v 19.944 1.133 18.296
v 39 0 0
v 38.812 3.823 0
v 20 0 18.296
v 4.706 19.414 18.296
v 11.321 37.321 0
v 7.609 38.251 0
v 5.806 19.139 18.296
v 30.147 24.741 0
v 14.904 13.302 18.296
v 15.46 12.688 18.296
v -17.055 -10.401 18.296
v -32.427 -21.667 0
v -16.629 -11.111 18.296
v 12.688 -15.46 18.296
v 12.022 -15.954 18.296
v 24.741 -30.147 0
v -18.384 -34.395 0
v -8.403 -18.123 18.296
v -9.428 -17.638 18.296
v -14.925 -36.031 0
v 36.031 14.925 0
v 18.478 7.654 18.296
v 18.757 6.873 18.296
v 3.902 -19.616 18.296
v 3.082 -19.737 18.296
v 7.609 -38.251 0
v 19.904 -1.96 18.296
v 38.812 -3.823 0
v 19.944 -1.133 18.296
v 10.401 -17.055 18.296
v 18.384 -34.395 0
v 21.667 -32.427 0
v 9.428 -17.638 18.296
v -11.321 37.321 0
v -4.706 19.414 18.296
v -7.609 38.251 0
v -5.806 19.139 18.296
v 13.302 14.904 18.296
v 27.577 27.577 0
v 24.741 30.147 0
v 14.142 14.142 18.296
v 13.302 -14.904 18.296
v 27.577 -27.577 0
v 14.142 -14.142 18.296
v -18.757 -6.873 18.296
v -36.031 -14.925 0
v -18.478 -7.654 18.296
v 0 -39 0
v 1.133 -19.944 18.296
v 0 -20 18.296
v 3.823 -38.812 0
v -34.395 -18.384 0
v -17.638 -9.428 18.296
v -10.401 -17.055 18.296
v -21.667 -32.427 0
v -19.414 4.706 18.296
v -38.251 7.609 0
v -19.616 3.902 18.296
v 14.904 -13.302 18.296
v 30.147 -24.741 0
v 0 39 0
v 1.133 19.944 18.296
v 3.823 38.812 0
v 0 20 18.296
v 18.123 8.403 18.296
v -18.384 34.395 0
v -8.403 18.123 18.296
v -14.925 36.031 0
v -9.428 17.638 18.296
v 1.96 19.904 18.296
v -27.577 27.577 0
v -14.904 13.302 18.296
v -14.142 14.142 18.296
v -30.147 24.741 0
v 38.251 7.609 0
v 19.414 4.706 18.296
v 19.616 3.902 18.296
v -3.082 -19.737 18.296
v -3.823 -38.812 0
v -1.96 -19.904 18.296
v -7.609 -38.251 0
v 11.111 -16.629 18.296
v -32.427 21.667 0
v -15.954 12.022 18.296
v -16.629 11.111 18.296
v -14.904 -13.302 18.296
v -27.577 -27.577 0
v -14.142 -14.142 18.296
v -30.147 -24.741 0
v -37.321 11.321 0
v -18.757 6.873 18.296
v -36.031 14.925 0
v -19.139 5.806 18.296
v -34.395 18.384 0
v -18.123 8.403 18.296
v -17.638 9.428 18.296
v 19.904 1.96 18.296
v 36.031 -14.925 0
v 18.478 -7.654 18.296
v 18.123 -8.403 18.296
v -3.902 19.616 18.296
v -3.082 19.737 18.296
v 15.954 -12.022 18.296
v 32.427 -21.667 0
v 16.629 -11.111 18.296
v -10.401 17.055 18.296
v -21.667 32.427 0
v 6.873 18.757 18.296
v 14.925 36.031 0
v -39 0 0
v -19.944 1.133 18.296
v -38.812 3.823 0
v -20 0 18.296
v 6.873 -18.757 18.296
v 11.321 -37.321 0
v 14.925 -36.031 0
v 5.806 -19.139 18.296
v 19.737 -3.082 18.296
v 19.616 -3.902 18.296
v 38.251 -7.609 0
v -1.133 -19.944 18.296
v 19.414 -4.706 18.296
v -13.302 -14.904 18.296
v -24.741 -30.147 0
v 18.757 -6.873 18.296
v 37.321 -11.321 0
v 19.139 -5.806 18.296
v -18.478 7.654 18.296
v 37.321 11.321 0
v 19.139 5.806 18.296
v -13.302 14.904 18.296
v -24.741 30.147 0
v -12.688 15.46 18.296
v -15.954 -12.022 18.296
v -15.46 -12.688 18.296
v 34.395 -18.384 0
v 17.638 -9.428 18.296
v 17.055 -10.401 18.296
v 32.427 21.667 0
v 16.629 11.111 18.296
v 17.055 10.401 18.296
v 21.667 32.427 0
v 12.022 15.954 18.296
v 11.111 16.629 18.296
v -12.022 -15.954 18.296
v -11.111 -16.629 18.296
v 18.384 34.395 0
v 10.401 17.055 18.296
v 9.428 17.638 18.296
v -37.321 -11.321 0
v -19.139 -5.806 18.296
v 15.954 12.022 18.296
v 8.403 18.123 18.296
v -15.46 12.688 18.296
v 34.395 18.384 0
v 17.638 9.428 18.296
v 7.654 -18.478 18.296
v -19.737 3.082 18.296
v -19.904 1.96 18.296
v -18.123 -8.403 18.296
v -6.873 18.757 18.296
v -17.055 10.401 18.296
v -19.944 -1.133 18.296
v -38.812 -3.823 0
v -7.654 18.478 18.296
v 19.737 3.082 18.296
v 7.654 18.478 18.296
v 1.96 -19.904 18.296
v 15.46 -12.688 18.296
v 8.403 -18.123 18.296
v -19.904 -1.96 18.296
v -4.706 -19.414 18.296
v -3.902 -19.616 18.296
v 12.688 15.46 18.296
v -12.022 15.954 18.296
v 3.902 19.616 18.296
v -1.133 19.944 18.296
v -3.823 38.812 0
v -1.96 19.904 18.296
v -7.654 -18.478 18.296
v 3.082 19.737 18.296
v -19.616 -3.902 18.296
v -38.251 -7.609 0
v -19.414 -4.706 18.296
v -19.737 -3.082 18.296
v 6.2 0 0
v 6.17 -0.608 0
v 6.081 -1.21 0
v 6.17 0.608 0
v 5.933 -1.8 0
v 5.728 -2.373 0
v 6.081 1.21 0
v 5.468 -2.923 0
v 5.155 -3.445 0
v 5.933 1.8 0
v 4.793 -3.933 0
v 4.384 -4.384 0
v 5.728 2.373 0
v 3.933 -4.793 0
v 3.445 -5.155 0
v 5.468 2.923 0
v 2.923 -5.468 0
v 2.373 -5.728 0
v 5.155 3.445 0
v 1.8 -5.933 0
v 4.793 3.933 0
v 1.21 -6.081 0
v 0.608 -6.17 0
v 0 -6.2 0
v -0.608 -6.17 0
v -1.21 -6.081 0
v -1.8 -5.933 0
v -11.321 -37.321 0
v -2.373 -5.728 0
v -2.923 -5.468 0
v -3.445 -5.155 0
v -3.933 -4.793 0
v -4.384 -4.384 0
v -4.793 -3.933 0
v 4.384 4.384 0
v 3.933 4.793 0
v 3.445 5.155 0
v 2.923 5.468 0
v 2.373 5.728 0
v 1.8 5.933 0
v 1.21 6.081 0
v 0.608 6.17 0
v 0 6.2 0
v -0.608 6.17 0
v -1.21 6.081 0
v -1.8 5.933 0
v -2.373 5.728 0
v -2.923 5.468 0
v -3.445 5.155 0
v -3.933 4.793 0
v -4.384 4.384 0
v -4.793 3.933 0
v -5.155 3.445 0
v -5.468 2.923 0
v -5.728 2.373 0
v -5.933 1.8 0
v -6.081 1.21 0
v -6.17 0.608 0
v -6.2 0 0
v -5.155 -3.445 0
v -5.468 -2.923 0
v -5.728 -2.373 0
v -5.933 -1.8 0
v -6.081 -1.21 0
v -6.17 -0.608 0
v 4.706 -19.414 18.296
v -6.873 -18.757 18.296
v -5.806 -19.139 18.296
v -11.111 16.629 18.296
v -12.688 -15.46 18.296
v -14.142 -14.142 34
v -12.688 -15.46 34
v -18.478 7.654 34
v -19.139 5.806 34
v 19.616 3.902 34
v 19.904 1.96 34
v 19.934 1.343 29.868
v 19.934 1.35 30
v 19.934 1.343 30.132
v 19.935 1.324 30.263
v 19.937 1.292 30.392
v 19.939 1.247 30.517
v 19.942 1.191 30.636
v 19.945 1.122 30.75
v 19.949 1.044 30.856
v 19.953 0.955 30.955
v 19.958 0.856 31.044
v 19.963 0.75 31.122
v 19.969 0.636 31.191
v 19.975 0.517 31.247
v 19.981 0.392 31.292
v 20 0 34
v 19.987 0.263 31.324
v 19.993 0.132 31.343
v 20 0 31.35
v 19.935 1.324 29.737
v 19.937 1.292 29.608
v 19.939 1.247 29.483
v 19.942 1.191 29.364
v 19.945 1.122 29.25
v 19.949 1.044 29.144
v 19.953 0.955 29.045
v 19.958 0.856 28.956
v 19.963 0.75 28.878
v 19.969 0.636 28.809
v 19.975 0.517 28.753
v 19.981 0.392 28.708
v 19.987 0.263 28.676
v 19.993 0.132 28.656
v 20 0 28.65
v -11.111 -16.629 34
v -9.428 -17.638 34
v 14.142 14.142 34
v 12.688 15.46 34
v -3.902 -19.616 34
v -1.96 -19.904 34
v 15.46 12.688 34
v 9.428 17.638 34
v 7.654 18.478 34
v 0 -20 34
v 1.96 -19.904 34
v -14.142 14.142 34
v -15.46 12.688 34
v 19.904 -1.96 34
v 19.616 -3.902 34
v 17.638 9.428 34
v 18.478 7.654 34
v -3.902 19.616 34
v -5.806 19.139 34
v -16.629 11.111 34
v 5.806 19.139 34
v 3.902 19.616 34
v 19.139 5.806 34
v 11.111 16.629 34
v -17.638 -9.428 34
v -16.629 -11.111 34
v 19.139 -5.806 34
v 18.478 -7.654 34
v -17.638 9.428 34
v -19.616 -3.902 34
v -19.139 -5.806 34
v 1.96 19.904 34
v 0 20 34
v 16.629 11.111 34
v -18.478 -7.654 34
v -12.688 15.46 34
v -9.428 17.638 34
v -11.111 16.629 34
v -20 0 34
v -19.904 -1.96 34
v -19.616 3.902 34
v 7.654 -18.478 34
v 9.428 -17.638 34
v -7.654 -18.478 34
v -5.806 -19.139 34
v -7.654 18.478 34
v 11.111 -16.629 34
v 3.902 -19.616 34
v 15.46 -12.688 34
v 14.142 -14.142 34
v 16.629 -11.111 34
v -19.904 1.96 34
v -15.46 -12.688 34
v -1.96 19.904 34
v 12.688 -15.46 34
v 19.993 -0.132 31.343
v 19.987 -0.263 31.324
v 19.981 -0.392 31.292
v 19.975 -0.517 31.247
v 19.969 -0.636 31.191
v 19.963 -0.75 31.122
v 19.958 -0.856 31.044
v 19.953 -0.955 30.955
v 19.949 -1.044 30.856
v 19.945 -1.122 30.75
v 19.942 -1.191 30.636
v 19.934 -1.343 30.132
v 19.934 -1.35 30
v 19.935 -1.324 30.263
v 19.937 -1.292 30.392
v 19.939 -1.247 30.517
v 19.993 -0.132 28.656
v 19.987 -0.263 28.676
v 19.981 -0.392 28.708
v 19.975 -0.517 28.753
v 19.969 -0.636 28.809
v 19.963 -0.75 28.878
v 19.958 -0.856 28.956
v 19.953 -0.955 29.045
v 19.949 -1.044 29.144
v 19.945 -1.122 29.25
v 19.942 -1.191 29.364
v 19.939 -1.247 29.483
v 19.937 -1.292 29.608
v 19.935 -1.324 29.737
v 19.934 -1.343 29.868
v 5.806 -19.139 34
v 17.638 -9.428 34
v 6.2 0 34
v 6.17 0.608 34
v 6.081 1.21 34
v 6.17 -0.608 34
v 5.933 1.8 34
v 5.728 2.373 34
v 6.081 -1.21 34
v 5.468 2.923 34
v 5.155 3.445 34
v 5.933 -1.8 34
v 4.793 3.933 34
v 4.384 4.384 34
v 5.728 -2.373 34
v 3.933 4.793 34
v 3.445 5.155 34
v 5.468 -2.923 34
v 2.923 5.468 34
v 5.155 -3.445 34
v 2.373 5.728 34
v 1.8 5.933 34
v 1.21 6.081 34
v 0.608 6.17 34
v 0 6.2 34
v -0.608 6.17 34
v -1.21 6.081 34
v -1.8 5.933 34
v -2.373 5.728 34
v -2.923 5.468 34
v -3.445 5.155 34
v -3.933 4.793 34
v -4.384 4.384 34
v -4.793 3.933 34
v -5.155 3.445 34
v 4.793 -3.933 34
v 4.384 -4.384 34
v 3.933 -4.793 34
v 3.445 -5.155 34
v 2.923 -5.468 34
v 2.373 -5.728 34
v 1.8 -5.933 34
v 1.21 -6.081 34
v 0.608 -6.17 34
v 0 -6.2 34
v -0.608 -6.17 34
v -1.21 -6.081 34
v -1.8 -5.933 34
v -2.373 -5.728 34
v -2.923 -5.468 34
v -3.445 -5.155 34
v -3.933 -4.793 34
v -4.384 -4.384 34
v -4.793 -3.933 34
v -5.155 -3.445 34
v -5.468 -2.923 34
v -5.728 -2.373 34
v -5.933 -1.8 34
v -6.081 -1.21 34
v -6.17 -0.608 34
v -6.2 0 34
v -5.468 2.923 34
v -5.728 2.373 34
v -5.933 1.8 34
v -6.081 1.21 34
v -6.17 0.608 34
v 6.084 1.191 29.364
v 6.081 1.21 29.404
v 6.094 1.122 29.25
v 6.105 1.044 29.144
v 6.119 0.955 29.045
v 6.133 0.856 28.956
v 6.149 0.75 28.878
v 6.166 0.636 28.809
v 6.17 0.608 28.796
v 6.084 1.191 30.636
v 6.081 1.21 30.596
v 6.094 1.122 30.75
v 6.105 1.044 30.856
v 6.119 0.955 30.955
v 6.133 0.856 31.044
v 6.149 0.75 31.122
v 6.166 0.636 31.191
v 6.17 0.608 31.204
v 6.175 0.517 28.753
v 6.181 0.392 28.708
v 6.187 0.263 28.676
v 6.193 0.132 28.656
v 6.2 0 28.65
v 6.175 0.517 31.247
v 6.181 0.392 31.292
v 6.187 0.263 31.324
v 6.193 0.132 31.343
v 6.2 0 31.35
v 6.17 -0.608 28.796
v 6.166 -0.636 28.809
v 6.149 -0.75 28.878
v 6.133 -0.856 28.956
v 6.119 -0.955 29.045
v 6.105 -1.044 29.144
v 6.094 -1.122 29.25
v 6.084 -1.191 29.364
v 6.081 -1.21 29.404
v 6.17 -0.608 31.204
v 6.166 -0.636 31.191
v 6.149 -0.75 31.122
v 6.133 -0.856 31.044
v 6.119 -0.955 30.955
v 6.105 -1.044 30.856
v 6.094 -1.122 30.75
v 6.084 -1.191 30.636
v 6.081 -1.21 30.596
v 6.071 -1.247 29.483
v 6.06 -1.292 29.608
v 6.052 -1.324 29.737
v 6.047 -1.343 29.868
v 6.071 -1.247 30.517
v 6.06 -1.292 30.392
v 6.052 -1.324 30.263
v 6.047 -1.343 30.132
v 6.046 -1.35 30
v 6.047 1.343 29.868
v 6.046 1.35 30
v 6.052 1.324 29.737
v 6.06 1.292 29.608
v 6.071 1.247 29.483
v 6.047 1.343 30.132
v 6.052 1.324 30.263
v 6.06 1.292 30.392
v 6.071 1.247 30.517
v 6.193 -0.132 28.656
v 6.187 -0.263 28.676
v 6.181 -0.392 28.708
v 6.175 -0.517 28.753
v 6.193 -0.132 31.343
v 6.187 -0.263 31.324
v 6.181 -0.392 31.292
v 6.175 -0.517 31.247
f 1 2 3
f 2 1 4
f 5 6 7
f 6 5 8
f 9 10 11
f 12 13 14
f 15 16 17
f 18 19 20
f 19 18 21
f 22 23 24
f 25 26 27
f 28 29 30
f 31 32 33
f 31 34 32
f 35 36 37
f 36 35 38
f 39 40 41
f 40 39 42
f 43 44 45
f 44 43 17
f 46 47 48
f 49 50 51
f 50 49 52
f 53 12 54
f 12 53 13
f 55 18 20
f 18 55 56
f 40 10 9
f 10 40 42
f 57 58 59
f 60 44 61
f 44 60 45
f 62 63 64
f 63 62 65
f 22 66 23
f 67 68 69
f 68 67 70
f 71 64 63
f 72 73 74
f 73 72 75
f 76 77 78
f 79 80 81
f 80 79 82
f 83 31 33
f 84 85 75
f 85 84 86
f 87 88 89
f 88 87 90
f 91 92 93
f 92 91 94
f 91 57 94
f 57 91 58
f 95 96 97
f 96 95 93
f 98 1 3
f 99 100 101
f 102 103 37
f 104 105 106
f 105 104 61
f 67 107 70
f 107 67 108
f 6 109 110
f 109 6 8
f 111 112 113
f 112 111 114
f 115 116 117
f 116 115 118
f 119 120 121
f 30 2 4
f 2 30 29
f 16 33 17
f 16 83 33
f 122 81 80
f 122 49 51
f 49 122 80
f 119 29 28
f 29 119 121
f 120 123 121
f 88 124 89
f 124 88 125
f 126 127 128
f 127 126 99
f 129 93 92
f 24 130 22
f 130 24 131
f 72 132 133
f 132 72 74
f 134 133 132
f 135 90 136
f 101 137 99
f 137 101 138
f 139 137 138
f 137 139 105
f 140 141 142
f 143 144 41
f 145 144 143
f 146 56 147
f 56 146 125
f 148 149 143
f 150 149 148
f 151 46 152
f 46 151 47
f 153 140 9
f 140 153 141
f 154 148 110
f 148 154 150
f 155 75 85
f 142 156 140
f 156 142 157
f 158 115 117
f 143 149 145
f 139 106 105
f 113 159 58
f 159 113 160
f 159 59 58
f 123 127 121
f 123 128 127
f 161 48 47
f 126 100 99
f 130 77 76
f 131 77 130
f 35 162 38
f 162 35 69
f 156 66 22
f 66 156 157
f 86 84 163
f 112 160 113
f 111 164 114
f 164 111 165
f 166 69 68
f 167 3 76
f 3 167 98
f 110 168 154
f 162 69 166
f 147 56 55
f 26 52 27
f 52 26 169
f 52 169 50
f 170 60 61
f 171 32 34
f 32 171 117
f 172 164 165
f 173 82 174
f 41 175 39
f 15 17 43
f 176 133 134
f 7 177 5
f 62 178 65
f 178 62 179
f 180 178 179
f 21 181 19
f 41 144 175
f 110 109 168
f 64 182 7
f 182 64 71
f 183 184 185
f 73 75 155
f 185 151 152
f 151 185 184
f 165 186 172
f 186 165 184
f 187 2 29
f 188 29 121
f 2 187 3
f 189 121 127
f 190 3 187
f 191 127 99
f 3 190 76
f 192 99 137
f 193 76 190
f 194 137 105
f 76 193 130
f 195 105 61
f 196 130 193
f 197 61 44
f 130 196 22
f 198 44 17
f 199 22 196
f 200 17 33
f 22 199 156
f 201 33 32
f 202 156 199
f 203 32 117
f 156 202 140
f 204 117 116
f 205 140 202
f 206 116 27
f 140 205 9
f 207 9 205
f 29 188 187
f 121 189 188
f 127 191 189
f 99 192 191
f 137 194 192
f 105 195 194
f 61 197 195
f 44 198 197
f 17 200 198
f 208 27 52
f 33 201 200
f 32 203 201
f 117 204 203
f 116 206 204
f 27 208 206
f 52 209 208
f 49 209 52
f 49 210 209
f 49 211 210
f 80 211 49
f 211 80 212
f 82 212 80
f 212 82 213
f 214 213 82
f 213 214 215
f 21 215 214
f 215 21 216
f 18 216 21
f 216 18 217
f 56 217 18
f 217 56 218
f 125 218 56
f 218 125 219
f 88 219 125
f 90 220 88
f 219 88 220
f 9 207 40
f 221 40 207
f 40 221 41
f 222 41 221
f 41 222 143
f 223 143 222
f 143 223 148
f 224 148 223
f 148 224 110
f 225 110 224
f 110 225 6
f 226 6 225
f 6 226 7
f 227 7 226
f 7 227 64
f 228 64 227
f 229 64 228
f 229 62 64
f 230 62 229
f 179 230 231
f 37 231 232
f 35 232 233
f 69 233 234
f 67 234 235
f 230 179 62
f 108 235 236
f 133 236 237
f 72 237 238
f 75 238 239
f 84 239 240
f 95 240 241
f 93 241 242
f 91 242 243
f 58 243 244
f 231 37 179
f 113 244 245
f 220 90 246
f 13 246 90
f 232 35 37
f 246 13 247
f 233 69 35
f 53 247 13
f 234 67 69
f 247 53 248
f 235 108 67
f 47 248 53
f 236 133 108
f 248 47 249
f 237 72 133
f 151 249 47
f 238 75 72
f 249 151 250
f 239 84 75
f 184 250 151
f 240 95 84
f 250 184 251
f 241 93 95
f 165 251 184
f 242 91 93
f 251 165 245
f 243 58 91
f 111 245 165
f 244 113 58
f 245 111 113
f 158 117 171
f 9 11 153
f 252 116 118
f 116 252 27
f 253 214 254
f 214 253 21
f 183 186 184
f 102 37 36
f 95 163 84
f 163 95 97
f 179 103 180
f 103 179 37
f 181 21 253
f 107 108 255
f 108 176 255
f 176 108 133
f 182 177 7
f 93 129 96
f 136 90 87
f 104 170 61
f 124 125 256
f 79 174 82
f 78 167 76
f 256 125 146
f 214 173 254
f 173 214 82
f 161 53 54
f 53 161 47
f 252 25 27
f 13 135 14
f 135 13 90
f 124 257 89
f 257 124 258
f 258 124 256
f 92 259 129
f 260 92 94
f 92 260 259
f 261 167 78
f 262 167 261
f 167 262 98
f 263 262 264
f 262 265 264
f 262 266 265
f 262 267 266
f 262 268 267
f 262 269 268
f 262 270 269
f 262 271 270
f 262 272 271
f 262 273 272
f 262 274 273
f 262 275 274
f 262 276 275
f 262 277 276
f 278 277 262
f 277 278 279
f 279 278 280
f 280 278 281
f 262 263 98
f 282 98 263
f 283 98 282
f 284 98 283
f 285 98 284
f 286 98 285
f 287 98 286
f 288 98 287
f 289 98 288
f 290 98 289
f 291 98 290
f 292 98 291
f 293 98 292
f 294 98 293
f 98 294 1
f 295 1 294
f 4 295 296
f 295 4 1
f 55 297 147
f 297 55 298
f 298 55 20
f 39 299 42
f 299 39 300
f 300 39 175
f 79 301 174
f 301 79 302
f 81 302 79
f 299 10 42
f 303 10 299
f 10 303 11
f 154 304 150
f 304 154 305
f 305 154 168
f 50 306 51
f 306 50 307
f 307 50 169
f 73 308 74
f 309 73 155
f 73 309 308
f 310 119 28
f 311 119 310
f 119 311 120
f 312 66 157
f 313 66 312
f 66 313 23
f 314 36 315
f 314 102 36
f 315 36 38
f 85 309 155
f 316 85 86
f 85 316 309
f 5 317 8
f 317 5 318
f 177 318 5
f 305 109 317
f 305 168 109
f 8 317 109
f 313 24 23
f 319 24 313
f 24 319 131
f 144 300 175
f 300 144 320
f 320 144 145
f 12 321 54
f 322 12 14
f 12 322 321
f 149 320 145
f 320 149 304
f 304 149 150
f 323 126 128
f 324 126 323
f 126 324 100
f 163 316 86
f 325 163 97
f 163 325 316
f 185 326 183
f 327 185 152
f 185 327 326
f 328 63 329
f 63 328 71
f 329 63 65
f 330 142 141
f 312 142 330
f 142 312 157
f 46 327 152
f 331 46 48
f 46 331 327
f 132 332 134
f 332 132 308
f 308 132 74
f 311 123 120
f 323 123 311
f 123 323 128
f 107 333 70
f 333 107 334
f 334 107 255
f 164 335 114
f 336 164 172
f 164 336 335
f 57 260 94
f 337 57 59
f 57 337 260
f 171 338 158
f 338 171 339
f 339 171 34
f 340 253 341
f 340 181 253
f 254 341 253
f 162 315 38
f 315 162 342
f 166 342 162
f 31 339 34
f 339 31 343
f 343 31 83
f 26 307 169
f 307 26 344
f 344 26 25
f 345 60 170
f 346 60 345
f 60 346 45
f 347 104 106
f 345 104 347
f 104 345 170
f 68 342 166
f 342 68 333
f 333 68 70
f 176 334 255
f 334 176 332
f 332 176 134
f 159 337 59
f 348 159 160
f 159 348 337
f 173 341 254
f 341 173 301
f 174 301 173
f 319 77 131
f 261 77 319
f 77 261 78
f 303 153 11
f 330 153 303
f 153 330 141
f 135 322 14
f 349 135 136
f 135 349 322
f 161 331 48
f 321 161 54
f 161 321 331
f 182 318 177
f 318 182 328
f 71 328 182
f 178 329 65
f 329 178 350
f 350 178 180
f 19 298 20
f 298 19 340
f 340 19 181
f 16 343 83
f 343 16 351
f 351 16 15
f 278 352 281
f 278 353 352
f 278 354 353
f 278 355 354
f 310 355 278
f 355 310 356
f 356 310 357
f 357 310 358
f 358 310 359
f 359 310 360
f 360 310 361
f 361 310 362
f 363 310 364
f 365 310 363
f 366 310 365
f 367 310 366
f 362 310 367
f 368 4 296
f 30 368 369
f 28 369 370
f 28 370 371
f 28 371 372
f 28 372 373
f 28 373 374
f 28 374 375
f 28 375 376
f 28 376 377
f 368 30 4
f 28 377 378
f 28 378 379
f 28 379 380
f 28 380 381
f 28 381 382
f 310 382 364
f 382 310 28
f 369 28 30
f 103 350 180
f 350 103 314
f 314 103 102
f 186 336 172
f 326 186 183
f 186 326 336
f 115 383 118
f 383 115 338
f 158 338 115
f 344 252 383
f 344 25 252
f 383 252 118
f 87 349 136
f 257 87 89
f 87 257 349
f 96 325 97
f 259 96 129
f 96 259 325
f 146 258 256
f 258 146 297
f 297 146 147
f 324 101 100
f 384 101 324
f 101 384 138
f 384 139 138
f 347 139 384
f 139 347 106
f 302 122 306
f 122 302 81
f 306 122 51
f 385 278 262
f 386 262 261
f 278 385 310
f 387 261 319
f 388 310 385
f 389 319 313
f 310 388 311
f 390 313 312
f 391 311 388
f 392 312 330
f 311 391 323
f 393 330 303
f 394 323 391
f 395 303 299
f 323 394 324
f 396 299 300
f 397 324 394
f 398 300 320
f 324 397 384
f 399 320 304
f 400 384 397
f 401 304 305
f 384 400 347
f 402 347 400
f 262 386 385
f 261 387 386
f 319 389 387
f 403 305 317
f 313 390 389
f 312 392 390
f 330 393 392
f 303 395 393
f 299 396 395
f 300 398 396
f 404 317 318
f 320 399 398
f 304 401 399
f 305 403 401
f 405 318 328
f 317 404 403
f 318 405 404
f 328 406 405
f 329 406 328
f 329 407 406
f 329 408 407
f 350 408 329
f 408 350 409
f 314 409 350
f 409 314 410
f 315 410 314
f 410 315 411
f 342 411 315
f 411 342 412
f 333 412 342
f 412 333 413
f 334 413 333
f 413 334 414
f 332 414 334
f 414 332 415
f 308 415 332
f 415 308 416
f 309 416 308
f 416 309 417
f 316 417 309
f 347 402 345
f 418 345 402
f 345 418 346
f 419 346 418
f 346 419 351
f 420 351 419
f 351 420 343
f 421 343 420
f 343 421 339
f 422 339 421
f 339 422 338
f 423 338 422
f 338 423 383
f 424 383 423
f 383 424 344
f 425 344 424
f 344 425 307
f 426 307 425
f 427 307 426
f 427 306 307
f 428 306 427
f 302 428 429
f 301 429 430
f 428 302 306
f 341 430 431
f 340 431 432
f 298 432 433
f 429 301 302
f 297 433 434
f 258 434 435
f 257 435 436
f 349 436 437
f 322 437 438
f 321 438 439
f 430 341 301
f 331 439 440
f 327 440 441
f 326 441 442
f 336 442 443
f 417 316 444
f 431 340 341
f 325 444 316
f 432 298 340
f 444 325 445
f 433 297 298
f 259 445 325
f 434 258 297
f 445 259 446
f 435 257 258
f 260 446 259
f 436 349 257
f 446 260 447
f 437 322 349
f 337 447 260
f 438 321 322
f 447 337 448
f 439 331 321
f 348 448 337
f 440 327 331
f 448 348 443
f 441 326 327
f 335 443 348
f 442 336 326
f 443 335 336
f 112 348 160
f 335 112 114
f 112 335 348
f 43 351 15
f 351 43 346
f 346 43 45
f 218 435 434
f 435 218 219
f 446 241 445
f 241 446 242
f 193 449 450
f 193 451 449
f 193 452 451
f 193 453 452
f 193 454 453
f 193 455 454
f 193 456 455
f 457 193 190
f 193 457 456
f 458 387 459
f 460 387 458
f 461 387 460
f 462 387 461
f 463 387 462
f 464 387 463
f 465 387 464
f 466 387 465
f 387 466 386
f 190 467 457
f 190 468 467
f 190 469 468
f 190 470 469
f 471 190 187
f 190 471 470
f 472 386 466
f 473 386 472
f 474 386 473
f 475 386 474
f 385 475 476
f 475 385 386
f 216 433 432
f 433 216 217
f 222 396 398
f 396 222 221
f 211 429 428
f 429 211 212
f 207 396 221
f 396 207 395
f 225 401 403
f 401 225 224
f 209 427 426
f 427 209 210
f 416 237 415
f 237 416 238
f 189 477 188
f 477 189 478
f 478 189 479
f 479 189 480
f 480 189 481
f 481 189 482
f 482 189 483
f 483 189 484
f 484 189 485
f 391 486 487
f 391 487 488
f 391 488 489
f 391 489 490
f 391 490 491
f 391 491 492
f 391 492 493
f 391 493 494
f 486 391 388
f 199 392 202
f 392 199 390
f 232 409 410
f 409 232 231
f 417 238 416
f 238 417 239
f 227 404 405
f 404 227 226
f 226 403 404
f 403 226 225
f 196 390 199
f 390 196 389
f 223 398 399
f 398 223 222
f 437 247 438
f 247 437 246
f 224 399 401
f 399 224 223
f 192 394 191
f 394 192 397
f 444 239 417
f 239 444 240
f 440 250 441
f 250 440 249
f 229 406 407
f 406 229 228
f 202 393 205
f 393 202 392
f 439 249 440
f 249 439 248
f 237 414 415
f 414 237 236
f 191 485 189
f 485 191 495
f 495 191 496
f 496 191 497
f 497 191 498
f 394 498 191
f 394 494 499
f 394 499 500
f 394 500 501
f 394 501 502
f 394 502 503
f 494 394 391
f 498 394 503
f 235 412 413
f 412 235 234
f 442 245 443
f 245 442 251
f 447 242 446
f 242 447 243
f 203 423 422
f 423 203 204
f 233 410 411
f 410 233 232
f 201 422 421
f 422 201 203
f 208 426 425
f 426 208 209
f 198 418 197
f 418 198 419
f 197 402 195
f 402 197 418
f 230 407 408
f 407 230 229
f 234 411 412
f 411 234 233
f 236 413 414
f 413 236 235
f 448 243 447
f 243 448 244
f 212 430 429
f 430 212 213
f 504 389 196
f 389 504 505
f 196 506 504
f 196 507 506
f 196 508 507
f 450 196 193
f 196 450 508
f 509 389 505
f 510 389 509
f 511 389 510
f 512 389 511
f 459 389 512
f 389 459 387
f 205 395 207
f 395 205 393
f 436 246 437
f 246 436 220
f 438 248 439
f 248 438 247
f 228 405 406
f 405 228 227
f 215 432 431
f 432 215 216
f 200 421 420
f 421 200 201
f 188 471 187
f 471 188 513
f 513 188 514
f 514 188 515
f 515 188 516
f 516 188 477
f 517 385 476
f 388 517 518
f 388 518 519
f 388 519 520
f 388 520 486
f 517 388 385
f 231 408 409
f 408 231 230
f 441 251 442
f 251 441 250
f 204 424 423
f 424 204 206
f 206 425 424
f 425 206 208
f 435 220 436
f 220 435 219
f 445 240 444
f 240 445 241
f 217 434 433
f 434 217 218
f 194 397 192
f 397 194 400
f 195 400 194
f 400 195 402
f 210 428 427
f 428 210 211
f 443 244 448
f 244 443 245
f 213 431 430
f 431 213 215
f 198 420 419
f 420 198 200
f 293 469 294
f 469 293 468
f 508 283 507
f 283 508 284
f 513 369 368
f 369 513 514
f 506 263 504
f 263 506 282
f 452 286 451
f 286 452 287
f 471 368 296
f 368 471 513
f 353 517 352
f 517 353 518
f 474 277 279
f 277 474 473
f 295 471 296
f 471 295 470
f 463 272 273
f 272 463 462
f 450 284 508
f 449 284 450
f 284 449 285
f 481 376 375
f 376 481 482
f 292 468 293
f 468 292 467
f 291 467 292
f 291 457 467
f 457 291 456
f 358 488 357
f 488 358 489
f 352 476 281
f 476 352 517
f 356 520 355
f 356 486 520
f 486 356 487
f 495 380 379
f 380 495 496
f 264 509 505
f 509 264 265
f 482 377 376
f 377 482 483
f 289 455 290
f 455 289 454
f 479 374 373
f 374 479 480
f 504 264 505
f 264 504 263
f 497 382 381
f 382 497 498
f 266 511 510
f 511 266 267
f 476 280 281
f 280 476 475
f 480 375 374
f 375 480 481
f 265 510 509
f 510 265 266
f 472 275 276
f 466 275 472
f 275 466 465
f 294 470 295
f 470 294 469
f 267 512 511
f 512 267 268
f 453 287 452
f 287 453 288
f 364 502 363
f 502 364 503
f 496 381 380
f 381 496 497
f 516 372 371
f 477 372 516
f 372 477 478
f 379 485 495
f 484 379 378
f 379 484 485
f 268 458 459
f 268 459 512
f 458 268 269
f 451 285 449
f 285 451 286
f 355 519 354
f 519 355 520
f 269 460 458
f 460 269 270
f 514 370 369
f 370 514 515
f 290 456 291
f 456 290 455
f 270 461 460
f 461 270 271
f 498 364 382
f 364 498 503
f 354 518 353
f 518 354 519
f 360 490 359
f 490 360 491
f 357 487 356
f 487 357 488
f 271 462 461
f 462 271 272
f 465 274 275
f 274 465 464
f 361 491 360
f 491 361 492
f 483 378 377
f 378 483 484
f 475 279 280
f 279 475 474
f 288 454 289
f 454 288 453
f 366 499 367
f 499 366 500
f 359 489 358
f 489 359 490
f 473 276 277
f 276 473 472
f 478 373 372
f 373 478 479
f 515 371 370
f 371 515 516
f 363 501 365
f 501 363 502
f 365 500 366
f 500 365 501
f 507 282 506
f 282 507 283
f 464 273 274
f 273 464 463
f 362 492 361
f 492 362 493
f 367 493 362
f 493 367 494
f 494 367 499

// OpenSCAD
// file: ../fj.scad
// FreeJet FJ-2 - shared dimensions and helpers.
// Coordinates (mm): X = carriage travel (left -> right, 0 = inner face of the left plate)
//                   Y = paper travel (paper moves toward +Y, 0 = black nozzle line)
//                   Z = up (0 = paper surface on the platen)
// Every part file includes this, so changing a number here moves everything.

$fn = 64;
e = 0.01;
tol = 0.25;          // clearance for printed fits

// ---- which cartridges? (HP 63 / 302 / 123 / 803 family) ---------------------------
// "K" = black only, "CMY" = tri-colour only, "KCMY" = black + tri-colour side by side.
CARTS     = "K";
N_SLOTS   = CARTS == "KCMY" ? 2 : 1;
head_pitch = 28;                      // black-to-colour cartridge spacing in the carriage
head_span = (N_SLOTS - 1) * head_pitch;
function slot_ink(i) = CARTS == "CMY" ? "C" : (i == 0 ? "K" : "C");

// ---- frame ----------------------------------------------------------------
inner_w   = 360 + 2 * head_span;     // distance between the side plates
plate_t   = 8;
rod_d     = 8;
// rods reach through both plates plus a printed collar each side; rounded up to a length
// you can buy (400 mm for one cartridge, 500 mm for black + colour, or cut them)
rod_len   = ceil((inner_w + 2 * 8 + 2 * 8 + 8) / 100) * 100;
plate_y0  = -128;    // side plate outline in Y (includes the roll-holder ear)
plate_y1  = 84;
plate_z0  = -70;     // bottom of the feet
plate_z1  = 70;

// ---- carriage rods ------------------------------------------------------------
rail_y    = -42;
rail_lo_z = 14;
rail_hi_z = 50;
belt_y    = -60;     // axis line of the X motor pulley and idler (both vertical)
belt_z    = 32;      // height of the belt centre
belt_r    = 20*2/PI/2;          // 20T GT2 pitch radius
belt_front_y = belt_y + belt_r; // strand clamped to the carriage
belt_back_y  = belt_y - belt_r; // return strand, passes behind the carriage

// ---- paper path: ONE feed roller just behind the printhead ----------------------------
tire_od   = 22;      // feed roller outside diameter (TPU tires on printed hubs)
feed_y    = -25;     // feed roller axis: as close behind the nozzles as the carriage allows
shaft_z   = -tire_od/2;
// spring-steel leaves press the paper onto the roller (no pinch shaft). They hang from a light
// printed bar spanning the frame above the paper entry; the paper slides in under the bar.
leaf_bar_y = -70;    // bar centre line
leaf_bar_z = 3;      // underside of the bar (paper passes below)
leaf_y1   = -21;     // leaf tip, just past the top of the roller
leaf_w    = 10;      // 0.3 mm spring steel (feeler-gauge strip), cut 52 mm long
leaf_angle = 7.5;    // ledge tilt: the free leaf would end ~2 mm below the paper -> ~0.4 N
tray_y1   = -74;     // front edge of the paper tray
// platen = a printed beam of bolted segments that also braces the frame
web_y     = [-50, -8, 22, 74];   // stiffening webs under the platen (run along X)
web_t     = 4;
web_z0    = -18;                  // bottom of the webs
flange_y  = [-50, 74];            // the two outer webs bolt to the side plates
flange_z  = [-9, -16];            // M3 bolt heights in the plates (vertical slots in the flanges)
platen_y0 = -62;     // platen top surface extent (entry ramp -> tear-off edge)
platen_y1 = 84;
sensor_y  = -42;     // paper lever switch, just before the roller nip
paper_x0  = 70 + head_span;   // paper left edge (fixed guide)
paper_w   = 220;     // widest sheet
sensor_x  = paper_x0 + 14;   // paper lever switch X
tire_x    = [paper_x0+20, paper_x0+75, paper_x0+145, paper_x0+200];  // roller positions

// ---- feed drive: 20T on the motor -> 60T printed pulley on the roller, 200 mm GT2 loop ----
pulley_teeth = 60;
feed_ctr  = 58.6;                     // centre distance for a 200 mm loop with 20T/60T
feed_dir  = [-0.79, -0.62];           // motor sits below and behind the roller
feed_motor_y = feed_y + feed_ctr * feed_dir[0];
feed_motor_z = shaft_z + feed_ctr * feed_dir[1];

// ---- roll holder: keyhole slots in the side plates -------------------------------------
roll_y    = -116;    // spindle axis
roll_z    = 62;
spindle_d = 12;

// ---- cartridges (MEASURE YOURS AND ADJUST) ------------------------------------------------
cart_w    = 21;      // across the carriage travel (X)
cart_d    = 37;      // front-to-back (Y)
cart_h    = 47;
nz_back   = 12;      // nozzle line distance from the contact (back) face
head_gap  = 1.2;     // nozzle plate height above the paper
flex_w    = 22;  flex_h = 26;   // area for the contact flex (salvaged from an HP DeskJet carriage)
carr_w    = 54 + head_span;     // carriage width along X
park_x    = 33;      // black (slot 0) nozzles X when parked (capped); carriage left face at 6
function slot_x(i) = (i - (N_SLOTS - 1) / 2) * head_pitch;   // slot i vs carriage centre

// ---- service station ------------------------------------------------------------
home_x    = 30;      // slot-0 nozzle X where the home switch trips (firmware X = 0)
sled_engage = 9;     // sled travel when parked (cap pressed on the nozzles)
cap_x     = park_x + sled_engage;   // slot-0 cap centre with the sled retracted (caps at head_pitch)
wiper_x   = 56 + head_span;
spit_x    = 62 + head_span;      // firmware spit_x_um = (spit_x - home_x) * 1000

// ---- hardware -----------------------------------------------------------------
lm8uu_d = 15; lm8uu_l = 24;
b608_d = 22; b608_w = 7;
m3 = 3.2; m3_head = 6; m3_nut = 6.4;   // across flats + tolerance
m25 = 2.7;
nema_hole = 31; nema_body = 42.3; nema_boss = 22.5;

// ---- derived layout ------------------------------------------------------------------
// segment boundaries: segment 0 carries the service-station end, the rest share the width
platen_seg0_end = paper_x0 + 88 <= 160 ? paper_x0 + 88 : paper_x0 - 10;   // keep joints off the sensor
platen_rest = ceil((inner_w - platen_seg0_end) / 130);
platen_segs = 1 + platen_rest;
function platen_seg_x(s) = s == 0 ? [0, platen_seg0_end] :
    let(w = (inner_w - platen_seg0_end) / platen_rest)
    [platen_seg0_end + (s - 1) * w, s == platen_segs - 1 ? inner_w : platen_seg0_end + s * w];
// electronics tray position (bolts through the platen webs)
etray_x0  = paper_x0 + 80 + (N_SLOTS > 1 ? 15 : 0);   // keep its bolts off the platen joints
etray_bolts = [etray_x0 + 25, etray_x0 + 95];

module rod_hole(l=40, d=rod_d+tol) { cylinder(d=d, h=l, center=true); }
module m3_hole(l=40) { cylinder(d=m3, h=l, center=true); }
module m3_nut_trap(h=3) { cylinder(d=m3_nut/cos(30), h=h, $fn=6); }
module rounded_box(size, r=3) {
    hull() for (x=[r, size[0]-r], y=[r, size[1]-r]) translate([x, y, 0]) cylinder(r=r, h=size[2]);
}
module nema17_holes(l=20, slot=0) {
    for (x=[-1,1], y=[-1,1]) hull() for (s=[-slot/2, slot/2])
        translate([x*nema_hole/2, y*nema_hole/2 + s, 0]) cylinder(d=m3, h=l, center=true);
    hull() for (s=[-slot/2, slot/2]) translate([0, s, 0]) cylinder(d=nema_boss+1, h=l, center=true);
}

// ---- printed shaft collars --------------------------------------------------------
collar_od = 20; collar_w = 8;

// ---- carriage details ------------------------------------------------------------
carr_z0   = head_gap + 2.5;   // carriage walls stop above the nozzle plate
carr_z1   = 60;
cart_rest_z = 14;              // height (above cartridge bottom) of the side rest tabs; 0 = none
// main file
// Roll paper: the spindle drops into the keyhole slots in the side plates (no holder arms).
// PART = "core" (print 2: cones that centre a 25-76 mm paper core on the spindle) and
// "spindle" (print spindle_pieces of it, upright, 100 % infill: they plug together and are
// pinned with M3x16 + nuts). Rolls up to 220 mm wide and 90 mm diameter.
// Thread the paper under the leaf bar onto the roller, then print with --paper roll.
include <../fj.scad>
PART = "core";
sp_d = spindle_d;
spindle_len = inner_w + 2 * plate_t + 2 * 8;          // through both keyholes + a collar each side
spindle_pieces = ceil(spindle_len / 150);
sp_half = spindle_len / spindle_pieces;               // length of one piece
module core() {
    difference() {
        union() { cylinder(d1=78, d2=24, h=26); cylinder(d=40, h=34); }
        translate([0,0,-1]) cylinder(d=sp_d + 0.4, h=40);
        translate([0,0,30]) rotate([0,90,0]) cylinder(d=2.7, h=30);
    }
}
echo(str("roll spindle: print ", spindle_pieces, " pieces of ", sp_half, " mm"));
module spindle_half() difference() {       // one piece of the 12 mm spindle; joins at the spigot
    union() { cylinder(d=sp_d, h=sp_half); translate([0,0,sp_half]) cylinder(d=6, h=8); }
    translate([0,0,-1]) cylinder(d=6.3, h=9);         // socket for the other half's spigot
    for (z=[4, sp_half + 4]) translate([0,0,z]) rotate([90,0,0]) cylinder(d=m3, h=20, center=true);  // cross pin
}
if (PART == "core") core(); else spindle_half();
